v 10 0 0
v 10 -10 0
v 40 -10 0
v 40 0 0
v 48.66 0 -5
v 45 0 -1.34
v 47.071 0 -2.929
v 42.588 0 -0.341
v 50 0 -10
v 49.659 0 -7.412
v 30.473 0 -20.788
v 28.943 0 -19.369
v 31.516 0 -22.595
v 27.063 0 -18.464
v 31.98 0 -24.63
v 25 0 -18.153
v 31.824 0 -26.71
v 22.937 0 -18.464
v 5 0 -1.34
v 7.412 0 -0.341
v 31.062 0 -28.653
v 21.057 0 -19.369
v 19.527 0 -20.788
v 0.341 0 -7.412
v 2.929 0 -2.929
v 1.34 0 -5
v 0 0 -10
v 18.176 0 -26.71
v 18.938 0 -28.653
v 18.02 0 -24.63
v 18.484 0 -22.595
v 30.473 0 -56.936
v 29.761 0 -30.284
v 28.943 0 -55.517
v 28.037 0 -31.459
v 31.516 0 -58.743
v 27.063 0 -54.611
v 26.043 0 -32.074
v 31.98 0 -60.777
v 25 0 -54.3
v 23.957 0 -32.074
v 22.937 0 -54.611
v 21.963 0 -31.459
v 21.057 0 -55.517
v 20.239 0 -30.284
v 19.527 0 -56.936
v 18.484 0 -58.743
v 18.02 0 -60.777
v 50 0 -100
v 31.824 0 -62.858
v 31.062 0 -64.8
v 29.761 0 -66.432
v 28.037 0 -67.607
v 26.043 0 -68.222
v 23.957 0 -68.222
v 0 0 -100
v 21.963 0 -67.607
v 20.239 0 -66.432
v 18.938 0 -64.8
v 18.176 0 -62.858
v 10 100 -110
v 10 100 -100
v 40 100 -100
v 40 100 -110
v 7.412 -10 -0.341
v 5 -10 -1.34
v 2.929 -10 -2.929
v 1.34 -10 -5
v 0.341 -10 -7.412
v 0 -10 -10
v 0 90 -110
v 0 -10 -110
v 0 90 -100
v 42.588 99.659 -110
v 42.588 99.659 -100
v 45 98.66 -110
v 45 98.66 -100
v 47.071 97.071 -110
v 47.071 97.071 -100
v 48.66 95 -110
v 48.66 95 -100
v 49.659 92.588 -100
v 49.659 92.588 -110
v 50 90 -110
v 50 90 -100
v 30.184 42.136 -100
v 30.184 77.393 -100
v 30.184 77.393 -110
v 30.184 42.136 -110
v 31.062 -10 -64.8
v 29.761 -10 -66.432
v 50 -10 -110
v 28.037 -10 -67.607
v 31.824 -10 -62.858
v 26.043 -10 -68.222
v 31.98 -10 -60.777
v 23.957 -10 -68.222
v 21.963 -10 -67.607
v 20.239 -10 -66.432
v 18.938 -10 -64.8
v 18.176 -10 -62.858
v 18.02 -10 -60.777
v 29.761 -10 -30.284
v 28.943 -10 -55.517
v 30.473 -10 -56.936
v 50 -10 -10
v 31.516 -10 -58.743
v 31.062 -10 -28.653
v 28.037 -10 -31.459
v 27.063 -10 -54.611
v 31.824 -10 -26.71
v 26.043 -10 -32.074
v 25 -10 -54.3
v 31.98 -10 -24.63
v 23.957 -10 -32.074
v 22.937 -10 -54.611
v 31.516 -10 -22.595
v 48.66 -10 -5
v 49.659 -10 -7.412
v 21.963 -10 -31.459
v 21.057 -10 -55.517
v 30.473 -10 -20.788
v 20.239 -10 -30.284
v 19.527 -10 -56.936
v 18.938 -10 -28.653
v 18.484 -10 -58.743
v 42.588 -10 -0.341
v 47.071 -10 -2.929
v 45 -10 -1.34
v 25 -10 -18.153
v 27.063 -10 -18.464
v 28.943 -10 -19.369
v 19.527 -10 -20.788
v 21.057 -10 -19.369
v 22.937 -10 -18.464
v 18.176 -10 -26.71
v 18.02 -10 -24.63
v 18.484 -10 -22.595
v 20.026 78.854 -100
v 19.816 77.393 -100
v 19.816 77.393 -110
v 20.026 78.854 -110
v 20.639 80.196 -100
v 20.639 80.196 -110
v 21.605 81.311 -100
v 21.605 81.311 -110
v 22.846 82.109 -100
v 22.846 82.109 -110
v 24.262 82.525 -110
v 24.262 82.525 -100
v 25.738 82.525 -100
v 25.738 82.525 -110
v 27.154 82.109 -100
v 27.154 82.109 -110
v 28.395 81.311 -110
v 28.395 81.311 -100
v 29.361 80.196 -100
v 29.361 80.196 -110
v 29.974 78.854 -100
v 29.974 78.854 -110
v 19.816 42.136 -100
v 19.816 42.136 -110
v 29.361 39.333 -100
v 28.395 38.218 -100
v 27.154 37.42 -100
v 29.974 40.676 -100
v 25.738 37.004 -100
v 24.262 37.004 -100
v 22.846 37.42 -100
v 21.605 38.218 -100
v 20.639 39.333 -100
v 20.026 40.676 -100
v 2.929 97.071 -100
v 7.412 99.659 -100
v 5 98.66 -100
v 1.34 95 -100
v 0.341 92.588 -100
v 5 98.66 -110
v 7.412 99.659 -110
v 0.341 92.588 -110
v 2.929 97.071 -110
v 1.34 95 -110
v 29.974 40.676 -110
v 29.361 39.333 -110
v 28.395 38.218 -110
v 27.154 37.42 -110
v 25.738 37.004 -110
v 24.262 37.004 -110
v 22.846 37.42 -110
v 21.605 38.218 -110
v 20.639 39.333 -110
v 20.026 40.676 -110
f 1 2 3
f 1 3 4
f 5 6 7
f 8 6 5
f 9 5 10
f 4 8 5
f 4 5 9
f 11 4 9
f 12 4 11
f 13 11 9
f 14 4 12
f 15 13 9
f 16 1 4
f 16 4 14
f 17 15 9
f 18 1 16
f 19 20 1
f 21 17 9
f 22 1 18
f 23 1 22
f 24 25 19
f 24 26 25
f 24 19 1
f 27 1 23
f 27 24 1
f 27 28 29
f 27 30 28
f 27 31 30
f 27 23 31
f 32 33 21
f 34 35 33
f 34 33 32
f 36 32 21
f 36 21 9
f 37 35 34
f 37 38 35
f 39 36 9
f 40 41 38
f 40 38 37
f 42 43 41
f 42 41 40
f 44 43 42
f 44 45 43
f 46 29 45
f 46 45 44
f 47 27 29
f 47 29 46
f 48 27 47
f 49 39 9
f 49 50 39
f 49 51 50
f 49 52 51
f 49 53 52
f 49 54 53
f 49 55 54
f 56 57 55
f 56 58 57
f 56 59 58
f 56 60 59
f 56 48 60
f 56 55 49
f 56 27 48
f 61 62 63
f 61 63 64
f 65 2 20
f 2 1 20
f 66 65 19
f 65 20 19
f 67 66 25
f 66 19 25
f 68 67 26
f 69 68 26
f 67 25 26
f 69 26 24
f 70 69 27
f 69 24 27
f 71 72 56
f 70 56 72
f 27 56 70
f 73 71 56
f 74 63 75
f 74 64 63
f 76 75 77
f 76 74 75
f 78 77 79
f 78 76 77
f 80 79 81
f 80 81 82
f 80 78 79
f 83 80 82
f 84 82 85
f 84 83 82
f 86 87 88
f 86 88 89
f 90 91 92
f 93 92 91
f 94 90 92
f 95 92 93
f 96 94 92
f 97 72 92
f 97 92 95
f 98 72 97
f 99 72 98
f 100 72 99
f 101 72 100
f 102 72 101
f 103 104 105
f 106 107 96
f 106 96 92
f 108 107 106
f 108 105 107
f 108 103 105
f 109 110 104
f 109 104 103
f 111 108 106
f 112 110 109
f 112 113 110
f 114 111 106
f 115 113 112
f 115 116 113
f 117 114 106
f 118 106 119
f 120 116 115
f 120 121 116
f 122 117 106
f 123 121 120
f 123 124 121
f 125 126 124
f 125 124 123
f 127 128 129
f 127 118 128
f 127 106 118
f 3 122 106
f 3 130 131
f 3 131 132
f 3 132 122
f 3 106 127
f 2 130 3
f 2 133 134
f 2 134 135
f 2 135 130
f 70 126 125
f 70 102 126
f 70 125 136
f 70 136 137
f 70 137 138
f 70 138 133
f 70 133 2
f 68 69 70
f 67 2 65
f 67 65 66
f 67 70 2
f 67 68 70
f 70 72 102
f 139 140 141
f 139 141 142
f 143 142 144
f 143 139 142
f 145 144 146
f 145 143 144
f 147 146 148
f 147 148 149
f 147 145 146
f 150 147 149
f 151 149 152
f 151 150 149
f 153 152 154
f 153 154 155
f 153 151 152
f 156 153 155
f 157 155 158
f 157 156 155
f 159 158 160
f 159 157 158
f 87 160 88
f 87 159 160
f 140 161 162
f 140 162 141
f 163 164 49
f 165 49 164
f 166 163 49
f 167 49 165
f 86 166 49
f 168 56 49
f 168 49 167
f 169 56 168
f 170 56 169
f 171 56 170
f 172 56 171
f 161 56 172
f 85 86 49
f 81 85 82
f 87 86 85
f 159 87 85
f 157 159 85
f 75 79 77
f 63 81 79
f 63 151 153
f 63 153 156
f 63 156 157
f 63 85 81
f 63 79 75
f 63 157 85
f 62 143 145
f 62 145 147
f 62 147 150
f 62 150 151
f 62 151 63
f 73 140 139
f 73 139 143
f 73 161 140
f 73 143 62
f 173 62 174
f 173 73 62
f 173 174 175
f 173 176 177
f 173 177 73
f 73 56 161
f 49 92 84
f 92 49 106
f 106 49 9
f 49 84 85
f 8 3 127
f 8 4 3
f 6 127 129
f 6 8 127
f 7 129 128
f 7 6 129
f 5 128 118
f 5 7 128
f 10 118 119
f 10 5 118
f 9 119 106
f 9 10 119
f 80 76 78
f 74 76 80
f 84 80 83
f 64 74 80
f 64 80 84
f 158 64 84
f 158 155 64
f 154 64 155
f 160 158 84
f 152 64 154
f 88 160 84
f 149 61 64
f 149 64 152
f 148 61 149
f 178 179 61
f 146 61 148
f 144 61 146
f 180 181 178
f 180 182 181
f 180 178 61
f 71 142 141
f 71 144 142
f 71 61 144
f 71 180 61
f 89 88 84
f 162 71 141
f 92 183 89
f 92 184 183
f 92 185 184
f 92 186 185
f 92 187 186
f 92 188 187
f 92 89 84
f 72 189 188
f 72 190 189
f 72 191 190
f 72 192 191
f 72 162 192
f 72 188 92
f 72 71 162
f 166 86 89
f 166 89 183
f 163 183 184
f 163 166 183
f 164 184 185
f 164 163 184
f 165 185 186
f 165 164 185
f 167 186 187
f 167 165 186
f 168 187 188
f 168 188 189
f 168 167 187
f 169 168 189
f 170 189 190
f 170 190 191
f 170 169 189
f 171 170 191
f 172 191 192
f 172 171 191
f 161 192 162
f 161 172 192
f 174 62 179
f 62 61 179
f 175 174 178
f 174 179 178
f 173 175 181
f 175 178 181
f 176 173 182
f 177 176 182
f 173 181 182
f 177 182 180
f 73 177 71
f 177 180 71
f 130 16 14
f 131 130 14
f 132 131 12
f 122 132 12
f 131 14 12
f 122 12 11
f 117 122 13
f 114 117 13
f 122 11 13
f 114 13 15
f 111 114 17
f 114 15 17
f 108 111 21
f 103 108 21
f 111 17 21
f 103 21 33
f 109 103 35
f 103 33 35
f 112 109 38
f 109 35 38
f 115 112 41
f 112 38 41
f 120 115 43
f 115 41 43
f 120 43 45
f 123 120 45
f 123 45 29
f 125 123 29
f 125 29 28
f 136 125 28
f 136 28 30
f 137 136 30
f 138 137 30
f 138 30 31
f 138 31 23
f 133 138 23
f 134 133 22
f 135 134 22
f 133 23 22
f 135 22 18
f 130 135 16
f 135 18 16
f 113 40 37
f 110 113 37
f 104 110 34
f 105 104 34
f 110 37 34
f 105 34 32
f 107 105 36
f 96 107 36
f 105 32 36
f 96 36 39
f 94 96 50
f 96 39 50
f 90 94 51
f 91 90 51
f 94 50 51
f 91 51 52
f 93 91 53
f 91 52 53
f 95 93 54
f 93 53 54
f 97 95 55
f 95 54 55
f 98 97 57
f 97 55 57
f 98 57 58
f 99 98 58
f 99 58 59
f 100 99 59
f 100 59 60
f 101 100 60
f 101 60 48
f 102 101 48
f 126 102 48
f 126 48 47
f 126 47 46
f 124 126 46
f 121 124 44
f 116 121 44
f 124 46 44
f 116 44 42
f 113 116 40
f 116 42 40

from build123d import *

# Parameters (mm, degrees)
EXTRUDE_THIN1_DEPTH = 50
FILLET1_R           = 10
CUT_EXTRUDE1_DEPTH  = 10
SKETCH3_R           = 7
CUT_EXTRUDE2_DEPTH  = 10


with BuildPart() as part:
    # Sketch1 → Extrude-Thin1 (new body)
    with BuildSketch(Plane(origin=(0, 0, 0), x_dir=(0, 0, -1), z_dir=(1, 0, 0))):
        Polygon((0, 0), (100, 0), (100, 100), (110, 100), (110, -10), (0, -10), align=None)
    extrude(amount=EXTRUDE_THIN1_DEPTH)

    # Fillet1
    fillet1_edges = [part.edges().sort_by_distance(p)[0] for p in [
        (50, -5, 0),
        (0, -5, 0),
        (0, 100, -105),
        (50, 100, -105),
    ]]
    fillet(fillet1_edges, radius=FILLET1_R)

    # Sketch2 → Cut-Extrude1 (cut)
    with BuildSketch(Plane.XY.offset(-100)):
        with BuildLine():
            Line((30.184472994, 77.392944228), (30.184472994, 42.136183713))
            ThreePointArc((30.184472994, 42.136183713), (25, 36.951710719), (19.815527006, 42.136183713))
            Line((19.815527006, 42.136183713), (19.815527006, 77.392944228))
            ThreePointArc((19.815527006, 77.392944228), (25, 82.577417222), (30.184472994, 77.392944228))
        make_face()
    extrude(amount=-CUT_EXTRUDE1_DEPTH, mode=Mode.SUBTRACT)

    # Sketch3 → Cut-Extrude2 (cut)
    with BuildSketch(Plane(origin=(0, 0, 0), x_dir=(1, 0, 0), z_dir=(0, 1, 0))):
        with Locations(Location((25, 25.15267025, 0), (0, 0, 270))):
            Circle(SKETCH3_R)
        with Locations(Location((25, 61.300395832, 0), (0, 0, 270))):
            Circle(SKETCH3_R)
    extrude(amount=-CUT_EXTRUDE2_DEPTH, mode=Mode.SUBTRACT)


solid = part.part
